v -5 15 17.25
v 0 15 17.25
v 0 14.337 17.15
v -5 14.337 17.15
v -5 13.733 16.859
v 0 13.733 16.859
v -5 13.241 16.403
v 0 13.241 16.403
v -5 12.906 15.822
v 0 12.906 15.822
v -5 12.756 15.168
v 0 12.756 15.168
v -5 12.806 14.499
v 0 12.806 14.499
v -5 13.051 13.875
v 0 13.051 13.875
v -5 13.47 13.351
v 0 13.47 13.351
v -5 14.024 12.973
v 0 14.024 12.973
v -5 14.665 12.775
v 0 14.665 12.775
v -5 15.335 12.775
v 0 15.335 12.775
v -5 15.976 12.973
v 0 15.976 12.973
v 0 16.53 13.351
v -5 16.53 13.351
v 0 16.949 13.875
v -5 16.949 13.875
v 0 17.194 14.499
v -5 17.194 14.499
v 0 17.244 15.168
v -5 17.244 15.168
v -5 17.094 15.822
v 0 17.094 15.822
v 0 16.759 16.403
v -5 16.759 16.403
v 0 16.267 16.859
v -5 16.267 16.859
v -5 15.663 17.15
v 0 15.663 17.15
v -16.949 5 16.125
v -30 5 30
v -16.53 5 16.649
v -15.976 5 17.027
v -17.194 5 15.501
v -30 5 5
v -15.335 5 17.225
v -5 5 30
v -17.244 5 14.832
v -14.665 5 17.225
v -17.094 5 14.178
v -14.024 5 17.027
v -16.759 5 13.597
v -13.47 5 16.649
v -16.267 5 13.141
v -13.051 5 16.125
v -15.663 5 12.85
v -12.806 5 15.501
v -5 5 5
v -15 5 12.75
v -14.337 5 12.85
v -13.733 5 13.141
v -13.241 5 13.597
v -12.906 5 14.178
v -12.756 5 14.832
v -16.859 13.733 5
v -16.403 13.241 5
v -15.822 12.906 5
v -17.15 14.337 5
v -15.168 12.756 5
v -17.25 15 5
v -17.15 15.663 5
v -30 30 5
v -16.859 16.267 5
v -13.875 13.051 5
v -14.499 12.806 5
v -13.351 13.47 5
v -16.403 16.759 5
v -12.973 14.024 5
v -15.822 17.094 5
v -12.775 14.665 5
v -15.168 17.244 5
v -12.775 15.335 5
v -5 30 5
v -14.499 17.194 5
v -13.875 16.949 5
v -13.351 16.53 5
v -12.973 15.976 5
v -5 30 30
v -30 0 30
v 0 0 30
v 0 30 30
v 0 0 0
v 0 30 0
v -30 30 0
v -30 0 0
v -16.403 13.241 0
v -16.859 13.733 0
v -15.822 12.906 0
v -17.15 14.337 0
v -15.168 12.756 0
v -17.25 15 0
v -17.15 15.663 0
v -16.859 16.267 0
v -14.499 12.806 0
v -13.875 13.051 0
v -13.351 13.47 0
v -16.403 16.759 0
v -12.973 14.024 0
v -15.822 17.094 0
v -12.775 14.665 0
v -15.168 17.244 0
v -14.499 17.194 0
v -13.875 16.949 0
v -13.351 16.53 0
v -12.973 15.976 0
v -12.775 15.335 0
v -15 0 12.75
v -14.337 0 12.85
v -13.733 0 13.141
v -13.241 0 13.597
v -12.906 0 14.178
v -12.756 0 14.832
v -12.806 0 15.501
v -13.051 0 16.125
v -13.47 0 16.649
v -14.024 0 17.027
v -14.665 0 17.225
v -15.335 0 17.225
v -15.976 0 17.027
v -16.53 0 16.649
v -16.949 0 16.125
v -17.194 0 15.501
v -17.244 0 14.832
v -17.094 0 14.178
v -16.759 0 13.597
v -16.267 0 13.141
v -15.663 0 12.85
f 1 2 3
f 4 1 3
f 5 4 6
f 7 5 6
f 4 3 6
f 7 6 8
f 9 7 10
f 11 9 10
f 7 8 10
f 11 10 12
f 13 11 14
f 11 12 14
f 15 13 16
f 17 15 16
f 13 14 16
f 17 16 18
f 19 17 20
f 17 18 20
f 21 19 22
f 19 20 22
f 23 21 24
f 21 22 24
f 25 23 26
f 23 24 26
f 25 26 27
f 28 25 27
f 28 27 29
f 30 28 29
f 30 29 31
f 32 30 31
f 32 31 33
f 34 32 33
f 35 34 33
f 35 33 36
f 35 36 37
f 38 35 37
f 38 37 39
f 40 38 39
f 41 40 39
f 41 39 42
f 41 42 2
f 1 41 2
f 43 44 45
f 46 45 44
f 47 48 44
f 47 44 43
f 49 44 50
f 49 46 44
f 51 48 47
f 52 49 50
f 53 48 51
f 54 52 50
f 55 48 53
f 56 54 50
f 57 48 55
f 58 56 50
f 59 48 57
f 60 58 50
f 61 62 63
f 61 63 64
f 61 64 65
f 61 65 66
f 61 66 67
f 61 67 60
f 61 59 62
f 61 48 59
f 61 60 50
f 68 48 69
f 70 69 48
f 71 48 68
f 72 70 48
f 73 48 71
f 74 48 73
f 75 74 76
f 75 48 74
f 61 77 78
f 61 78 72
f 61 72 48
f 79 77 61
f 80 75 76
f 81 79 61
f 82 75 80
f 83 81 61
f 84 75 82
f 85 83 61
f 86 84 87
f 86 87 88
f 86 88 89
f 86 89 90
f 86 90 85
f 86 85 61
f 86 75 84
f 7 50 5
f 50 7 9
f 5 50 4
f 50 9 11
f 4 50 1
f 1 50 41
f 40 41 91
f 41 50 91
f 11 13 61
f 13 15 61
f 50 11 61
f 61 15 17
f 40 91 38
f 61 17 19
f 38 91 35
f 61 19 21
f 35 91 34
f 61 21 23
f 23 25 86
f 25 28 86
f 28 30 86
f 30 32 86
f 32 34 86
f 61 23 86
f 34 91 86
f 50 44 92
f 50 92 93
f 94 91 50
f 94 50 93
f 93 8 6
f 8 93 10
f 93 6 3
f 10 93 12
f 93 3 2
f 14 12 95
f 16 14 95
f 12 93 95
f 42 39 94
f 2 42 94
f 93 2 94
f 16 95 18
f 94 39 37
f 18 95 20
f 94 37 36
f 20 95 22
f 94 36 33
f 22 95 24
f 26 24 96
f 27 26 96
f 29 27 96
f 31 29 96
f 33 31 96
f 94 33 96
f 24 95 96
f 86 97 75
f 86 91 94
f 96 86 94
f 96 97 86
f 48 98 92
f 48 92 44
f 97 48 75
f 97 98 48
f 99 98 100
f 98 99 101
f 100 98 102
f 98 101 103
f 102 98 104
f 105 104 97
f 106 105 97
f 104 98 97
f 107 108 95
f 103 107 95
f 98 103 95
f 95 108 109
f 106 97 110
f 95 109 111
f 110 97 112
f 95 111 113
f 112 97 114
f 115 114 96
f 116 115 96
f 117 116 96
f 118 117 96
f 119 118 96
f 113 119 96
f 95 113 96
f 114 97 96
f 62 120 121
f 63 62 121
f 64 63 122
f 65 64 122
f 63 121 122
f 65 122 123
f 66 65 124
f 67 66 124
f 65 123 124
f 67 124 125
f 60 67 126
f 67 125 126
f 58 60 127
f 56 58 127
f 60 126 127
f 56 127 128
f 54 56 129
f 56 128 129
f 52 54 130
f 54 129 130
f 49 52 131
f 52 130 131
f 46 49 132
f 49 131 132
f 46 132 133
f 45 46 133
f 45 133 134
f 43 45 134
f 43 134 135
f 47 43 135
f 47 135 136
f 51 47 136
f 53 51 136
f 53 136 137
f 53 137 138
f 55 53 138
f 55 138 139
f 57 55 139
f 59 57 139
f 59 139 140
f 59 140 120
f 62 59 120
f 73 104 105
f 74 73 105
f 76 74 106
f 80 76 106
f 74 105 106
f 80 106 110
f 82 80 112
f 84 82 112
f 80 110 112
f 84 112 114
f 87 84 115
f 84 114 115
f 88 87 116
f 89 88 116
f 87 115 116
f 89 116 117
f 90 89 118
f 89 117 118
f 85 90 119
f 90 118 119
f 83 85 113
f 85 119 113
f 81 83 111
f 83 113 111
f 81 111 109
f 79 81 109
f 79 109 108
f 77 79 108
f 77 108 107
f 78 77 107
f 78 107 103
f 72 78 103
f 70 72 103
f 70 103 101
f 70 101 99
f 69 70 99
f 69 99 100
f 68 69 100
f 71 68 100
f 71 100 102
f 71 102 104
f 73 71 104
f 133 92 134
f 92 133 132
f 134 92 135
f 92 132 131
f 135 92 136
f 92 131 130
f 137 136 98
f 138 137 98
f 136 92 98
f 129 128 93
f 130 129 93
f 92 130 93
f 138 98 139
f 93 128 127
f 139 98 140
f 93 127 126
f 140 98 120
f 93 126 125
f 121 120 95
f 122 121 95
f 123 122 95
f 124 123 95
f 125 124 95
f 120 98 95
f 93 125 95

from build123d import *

# Parameters (mm, degrees)
ESBO_O1_W                         = 30
ESBO_O1_H                         = 30
RESSALTO_EXTRUS_O1_DEPTH          = 30
ESBO_O3_W                         = 25
ESBO_O3_H                         = 25
CORTE_EXTRUS_O2_DEPTH             = 25
FURO_COM_FOLGA_DE_M41_D           = 4.5
FURO_COM_FOLGA_DE_M41_ON_FACE_2_D = 4.5
FURO_COM_FOLGA_DE_M41_ON_FACE_3_D = 4.5


with BuildPart() as part:
    # Esboço1 → Ressalto-extrusão1 (new body)
    with BuildSketch(Plane.XY):
        with Locations((-15, 15)):
            Rectangle(ESBO_O1_W, ESBO_O1_H)
    extrude(amount=RESSALTO_EXTRUS_O1_DEPTH)

    # Esboço3 → Corte-extrusão2 (cut)
    with BuildSketch(Plane(origin=(0, 30, 0), x_dir=(1, 0, 0), z_dir=(0, 1, 0))):
        with Locations((-17.5, -17.5)):
            Rectangle(ESBO_O3_W, ESBO_O3_H)
    extrude(amount=-CORTE_EXTRUS_O2_DEPTH, mode=Mode.SUBTRACT)

    # Furo com folga de M41 (through all)
    with Locations(Plane(origin=(-5, 15, 15), x_dir=(0, 0, -1), z_dir=(-1, 0, 0))):
        with Locations((0, 0)):
            Hole(FURO_COM_FOLGA_DE_M41_D / 2)

    # Furo com folga de M41 on face 2 (through all)
    with Locations(Plane(origin=(-15, 15, 5), x_dir=(1, 0, 0), z_dir=(0, 0, 1))):
        with Locations((0, 0)):
            Hole(FURO_COM_FOLGA_DE_M41_ON_FACE_2_D / 2)

    # Furo com folga de M41 on face 3 (through all)
    with Locations(Plane(origin=(-15, 5, 15), x_dir=(0, 0, 1), z_dir=(0, 1, 0))):
        with Locations((0, 0)):
            Hole(FURO_COM_FOLGA_DE_M41_ON_FACE_3_D / 2)


solid = part.part
